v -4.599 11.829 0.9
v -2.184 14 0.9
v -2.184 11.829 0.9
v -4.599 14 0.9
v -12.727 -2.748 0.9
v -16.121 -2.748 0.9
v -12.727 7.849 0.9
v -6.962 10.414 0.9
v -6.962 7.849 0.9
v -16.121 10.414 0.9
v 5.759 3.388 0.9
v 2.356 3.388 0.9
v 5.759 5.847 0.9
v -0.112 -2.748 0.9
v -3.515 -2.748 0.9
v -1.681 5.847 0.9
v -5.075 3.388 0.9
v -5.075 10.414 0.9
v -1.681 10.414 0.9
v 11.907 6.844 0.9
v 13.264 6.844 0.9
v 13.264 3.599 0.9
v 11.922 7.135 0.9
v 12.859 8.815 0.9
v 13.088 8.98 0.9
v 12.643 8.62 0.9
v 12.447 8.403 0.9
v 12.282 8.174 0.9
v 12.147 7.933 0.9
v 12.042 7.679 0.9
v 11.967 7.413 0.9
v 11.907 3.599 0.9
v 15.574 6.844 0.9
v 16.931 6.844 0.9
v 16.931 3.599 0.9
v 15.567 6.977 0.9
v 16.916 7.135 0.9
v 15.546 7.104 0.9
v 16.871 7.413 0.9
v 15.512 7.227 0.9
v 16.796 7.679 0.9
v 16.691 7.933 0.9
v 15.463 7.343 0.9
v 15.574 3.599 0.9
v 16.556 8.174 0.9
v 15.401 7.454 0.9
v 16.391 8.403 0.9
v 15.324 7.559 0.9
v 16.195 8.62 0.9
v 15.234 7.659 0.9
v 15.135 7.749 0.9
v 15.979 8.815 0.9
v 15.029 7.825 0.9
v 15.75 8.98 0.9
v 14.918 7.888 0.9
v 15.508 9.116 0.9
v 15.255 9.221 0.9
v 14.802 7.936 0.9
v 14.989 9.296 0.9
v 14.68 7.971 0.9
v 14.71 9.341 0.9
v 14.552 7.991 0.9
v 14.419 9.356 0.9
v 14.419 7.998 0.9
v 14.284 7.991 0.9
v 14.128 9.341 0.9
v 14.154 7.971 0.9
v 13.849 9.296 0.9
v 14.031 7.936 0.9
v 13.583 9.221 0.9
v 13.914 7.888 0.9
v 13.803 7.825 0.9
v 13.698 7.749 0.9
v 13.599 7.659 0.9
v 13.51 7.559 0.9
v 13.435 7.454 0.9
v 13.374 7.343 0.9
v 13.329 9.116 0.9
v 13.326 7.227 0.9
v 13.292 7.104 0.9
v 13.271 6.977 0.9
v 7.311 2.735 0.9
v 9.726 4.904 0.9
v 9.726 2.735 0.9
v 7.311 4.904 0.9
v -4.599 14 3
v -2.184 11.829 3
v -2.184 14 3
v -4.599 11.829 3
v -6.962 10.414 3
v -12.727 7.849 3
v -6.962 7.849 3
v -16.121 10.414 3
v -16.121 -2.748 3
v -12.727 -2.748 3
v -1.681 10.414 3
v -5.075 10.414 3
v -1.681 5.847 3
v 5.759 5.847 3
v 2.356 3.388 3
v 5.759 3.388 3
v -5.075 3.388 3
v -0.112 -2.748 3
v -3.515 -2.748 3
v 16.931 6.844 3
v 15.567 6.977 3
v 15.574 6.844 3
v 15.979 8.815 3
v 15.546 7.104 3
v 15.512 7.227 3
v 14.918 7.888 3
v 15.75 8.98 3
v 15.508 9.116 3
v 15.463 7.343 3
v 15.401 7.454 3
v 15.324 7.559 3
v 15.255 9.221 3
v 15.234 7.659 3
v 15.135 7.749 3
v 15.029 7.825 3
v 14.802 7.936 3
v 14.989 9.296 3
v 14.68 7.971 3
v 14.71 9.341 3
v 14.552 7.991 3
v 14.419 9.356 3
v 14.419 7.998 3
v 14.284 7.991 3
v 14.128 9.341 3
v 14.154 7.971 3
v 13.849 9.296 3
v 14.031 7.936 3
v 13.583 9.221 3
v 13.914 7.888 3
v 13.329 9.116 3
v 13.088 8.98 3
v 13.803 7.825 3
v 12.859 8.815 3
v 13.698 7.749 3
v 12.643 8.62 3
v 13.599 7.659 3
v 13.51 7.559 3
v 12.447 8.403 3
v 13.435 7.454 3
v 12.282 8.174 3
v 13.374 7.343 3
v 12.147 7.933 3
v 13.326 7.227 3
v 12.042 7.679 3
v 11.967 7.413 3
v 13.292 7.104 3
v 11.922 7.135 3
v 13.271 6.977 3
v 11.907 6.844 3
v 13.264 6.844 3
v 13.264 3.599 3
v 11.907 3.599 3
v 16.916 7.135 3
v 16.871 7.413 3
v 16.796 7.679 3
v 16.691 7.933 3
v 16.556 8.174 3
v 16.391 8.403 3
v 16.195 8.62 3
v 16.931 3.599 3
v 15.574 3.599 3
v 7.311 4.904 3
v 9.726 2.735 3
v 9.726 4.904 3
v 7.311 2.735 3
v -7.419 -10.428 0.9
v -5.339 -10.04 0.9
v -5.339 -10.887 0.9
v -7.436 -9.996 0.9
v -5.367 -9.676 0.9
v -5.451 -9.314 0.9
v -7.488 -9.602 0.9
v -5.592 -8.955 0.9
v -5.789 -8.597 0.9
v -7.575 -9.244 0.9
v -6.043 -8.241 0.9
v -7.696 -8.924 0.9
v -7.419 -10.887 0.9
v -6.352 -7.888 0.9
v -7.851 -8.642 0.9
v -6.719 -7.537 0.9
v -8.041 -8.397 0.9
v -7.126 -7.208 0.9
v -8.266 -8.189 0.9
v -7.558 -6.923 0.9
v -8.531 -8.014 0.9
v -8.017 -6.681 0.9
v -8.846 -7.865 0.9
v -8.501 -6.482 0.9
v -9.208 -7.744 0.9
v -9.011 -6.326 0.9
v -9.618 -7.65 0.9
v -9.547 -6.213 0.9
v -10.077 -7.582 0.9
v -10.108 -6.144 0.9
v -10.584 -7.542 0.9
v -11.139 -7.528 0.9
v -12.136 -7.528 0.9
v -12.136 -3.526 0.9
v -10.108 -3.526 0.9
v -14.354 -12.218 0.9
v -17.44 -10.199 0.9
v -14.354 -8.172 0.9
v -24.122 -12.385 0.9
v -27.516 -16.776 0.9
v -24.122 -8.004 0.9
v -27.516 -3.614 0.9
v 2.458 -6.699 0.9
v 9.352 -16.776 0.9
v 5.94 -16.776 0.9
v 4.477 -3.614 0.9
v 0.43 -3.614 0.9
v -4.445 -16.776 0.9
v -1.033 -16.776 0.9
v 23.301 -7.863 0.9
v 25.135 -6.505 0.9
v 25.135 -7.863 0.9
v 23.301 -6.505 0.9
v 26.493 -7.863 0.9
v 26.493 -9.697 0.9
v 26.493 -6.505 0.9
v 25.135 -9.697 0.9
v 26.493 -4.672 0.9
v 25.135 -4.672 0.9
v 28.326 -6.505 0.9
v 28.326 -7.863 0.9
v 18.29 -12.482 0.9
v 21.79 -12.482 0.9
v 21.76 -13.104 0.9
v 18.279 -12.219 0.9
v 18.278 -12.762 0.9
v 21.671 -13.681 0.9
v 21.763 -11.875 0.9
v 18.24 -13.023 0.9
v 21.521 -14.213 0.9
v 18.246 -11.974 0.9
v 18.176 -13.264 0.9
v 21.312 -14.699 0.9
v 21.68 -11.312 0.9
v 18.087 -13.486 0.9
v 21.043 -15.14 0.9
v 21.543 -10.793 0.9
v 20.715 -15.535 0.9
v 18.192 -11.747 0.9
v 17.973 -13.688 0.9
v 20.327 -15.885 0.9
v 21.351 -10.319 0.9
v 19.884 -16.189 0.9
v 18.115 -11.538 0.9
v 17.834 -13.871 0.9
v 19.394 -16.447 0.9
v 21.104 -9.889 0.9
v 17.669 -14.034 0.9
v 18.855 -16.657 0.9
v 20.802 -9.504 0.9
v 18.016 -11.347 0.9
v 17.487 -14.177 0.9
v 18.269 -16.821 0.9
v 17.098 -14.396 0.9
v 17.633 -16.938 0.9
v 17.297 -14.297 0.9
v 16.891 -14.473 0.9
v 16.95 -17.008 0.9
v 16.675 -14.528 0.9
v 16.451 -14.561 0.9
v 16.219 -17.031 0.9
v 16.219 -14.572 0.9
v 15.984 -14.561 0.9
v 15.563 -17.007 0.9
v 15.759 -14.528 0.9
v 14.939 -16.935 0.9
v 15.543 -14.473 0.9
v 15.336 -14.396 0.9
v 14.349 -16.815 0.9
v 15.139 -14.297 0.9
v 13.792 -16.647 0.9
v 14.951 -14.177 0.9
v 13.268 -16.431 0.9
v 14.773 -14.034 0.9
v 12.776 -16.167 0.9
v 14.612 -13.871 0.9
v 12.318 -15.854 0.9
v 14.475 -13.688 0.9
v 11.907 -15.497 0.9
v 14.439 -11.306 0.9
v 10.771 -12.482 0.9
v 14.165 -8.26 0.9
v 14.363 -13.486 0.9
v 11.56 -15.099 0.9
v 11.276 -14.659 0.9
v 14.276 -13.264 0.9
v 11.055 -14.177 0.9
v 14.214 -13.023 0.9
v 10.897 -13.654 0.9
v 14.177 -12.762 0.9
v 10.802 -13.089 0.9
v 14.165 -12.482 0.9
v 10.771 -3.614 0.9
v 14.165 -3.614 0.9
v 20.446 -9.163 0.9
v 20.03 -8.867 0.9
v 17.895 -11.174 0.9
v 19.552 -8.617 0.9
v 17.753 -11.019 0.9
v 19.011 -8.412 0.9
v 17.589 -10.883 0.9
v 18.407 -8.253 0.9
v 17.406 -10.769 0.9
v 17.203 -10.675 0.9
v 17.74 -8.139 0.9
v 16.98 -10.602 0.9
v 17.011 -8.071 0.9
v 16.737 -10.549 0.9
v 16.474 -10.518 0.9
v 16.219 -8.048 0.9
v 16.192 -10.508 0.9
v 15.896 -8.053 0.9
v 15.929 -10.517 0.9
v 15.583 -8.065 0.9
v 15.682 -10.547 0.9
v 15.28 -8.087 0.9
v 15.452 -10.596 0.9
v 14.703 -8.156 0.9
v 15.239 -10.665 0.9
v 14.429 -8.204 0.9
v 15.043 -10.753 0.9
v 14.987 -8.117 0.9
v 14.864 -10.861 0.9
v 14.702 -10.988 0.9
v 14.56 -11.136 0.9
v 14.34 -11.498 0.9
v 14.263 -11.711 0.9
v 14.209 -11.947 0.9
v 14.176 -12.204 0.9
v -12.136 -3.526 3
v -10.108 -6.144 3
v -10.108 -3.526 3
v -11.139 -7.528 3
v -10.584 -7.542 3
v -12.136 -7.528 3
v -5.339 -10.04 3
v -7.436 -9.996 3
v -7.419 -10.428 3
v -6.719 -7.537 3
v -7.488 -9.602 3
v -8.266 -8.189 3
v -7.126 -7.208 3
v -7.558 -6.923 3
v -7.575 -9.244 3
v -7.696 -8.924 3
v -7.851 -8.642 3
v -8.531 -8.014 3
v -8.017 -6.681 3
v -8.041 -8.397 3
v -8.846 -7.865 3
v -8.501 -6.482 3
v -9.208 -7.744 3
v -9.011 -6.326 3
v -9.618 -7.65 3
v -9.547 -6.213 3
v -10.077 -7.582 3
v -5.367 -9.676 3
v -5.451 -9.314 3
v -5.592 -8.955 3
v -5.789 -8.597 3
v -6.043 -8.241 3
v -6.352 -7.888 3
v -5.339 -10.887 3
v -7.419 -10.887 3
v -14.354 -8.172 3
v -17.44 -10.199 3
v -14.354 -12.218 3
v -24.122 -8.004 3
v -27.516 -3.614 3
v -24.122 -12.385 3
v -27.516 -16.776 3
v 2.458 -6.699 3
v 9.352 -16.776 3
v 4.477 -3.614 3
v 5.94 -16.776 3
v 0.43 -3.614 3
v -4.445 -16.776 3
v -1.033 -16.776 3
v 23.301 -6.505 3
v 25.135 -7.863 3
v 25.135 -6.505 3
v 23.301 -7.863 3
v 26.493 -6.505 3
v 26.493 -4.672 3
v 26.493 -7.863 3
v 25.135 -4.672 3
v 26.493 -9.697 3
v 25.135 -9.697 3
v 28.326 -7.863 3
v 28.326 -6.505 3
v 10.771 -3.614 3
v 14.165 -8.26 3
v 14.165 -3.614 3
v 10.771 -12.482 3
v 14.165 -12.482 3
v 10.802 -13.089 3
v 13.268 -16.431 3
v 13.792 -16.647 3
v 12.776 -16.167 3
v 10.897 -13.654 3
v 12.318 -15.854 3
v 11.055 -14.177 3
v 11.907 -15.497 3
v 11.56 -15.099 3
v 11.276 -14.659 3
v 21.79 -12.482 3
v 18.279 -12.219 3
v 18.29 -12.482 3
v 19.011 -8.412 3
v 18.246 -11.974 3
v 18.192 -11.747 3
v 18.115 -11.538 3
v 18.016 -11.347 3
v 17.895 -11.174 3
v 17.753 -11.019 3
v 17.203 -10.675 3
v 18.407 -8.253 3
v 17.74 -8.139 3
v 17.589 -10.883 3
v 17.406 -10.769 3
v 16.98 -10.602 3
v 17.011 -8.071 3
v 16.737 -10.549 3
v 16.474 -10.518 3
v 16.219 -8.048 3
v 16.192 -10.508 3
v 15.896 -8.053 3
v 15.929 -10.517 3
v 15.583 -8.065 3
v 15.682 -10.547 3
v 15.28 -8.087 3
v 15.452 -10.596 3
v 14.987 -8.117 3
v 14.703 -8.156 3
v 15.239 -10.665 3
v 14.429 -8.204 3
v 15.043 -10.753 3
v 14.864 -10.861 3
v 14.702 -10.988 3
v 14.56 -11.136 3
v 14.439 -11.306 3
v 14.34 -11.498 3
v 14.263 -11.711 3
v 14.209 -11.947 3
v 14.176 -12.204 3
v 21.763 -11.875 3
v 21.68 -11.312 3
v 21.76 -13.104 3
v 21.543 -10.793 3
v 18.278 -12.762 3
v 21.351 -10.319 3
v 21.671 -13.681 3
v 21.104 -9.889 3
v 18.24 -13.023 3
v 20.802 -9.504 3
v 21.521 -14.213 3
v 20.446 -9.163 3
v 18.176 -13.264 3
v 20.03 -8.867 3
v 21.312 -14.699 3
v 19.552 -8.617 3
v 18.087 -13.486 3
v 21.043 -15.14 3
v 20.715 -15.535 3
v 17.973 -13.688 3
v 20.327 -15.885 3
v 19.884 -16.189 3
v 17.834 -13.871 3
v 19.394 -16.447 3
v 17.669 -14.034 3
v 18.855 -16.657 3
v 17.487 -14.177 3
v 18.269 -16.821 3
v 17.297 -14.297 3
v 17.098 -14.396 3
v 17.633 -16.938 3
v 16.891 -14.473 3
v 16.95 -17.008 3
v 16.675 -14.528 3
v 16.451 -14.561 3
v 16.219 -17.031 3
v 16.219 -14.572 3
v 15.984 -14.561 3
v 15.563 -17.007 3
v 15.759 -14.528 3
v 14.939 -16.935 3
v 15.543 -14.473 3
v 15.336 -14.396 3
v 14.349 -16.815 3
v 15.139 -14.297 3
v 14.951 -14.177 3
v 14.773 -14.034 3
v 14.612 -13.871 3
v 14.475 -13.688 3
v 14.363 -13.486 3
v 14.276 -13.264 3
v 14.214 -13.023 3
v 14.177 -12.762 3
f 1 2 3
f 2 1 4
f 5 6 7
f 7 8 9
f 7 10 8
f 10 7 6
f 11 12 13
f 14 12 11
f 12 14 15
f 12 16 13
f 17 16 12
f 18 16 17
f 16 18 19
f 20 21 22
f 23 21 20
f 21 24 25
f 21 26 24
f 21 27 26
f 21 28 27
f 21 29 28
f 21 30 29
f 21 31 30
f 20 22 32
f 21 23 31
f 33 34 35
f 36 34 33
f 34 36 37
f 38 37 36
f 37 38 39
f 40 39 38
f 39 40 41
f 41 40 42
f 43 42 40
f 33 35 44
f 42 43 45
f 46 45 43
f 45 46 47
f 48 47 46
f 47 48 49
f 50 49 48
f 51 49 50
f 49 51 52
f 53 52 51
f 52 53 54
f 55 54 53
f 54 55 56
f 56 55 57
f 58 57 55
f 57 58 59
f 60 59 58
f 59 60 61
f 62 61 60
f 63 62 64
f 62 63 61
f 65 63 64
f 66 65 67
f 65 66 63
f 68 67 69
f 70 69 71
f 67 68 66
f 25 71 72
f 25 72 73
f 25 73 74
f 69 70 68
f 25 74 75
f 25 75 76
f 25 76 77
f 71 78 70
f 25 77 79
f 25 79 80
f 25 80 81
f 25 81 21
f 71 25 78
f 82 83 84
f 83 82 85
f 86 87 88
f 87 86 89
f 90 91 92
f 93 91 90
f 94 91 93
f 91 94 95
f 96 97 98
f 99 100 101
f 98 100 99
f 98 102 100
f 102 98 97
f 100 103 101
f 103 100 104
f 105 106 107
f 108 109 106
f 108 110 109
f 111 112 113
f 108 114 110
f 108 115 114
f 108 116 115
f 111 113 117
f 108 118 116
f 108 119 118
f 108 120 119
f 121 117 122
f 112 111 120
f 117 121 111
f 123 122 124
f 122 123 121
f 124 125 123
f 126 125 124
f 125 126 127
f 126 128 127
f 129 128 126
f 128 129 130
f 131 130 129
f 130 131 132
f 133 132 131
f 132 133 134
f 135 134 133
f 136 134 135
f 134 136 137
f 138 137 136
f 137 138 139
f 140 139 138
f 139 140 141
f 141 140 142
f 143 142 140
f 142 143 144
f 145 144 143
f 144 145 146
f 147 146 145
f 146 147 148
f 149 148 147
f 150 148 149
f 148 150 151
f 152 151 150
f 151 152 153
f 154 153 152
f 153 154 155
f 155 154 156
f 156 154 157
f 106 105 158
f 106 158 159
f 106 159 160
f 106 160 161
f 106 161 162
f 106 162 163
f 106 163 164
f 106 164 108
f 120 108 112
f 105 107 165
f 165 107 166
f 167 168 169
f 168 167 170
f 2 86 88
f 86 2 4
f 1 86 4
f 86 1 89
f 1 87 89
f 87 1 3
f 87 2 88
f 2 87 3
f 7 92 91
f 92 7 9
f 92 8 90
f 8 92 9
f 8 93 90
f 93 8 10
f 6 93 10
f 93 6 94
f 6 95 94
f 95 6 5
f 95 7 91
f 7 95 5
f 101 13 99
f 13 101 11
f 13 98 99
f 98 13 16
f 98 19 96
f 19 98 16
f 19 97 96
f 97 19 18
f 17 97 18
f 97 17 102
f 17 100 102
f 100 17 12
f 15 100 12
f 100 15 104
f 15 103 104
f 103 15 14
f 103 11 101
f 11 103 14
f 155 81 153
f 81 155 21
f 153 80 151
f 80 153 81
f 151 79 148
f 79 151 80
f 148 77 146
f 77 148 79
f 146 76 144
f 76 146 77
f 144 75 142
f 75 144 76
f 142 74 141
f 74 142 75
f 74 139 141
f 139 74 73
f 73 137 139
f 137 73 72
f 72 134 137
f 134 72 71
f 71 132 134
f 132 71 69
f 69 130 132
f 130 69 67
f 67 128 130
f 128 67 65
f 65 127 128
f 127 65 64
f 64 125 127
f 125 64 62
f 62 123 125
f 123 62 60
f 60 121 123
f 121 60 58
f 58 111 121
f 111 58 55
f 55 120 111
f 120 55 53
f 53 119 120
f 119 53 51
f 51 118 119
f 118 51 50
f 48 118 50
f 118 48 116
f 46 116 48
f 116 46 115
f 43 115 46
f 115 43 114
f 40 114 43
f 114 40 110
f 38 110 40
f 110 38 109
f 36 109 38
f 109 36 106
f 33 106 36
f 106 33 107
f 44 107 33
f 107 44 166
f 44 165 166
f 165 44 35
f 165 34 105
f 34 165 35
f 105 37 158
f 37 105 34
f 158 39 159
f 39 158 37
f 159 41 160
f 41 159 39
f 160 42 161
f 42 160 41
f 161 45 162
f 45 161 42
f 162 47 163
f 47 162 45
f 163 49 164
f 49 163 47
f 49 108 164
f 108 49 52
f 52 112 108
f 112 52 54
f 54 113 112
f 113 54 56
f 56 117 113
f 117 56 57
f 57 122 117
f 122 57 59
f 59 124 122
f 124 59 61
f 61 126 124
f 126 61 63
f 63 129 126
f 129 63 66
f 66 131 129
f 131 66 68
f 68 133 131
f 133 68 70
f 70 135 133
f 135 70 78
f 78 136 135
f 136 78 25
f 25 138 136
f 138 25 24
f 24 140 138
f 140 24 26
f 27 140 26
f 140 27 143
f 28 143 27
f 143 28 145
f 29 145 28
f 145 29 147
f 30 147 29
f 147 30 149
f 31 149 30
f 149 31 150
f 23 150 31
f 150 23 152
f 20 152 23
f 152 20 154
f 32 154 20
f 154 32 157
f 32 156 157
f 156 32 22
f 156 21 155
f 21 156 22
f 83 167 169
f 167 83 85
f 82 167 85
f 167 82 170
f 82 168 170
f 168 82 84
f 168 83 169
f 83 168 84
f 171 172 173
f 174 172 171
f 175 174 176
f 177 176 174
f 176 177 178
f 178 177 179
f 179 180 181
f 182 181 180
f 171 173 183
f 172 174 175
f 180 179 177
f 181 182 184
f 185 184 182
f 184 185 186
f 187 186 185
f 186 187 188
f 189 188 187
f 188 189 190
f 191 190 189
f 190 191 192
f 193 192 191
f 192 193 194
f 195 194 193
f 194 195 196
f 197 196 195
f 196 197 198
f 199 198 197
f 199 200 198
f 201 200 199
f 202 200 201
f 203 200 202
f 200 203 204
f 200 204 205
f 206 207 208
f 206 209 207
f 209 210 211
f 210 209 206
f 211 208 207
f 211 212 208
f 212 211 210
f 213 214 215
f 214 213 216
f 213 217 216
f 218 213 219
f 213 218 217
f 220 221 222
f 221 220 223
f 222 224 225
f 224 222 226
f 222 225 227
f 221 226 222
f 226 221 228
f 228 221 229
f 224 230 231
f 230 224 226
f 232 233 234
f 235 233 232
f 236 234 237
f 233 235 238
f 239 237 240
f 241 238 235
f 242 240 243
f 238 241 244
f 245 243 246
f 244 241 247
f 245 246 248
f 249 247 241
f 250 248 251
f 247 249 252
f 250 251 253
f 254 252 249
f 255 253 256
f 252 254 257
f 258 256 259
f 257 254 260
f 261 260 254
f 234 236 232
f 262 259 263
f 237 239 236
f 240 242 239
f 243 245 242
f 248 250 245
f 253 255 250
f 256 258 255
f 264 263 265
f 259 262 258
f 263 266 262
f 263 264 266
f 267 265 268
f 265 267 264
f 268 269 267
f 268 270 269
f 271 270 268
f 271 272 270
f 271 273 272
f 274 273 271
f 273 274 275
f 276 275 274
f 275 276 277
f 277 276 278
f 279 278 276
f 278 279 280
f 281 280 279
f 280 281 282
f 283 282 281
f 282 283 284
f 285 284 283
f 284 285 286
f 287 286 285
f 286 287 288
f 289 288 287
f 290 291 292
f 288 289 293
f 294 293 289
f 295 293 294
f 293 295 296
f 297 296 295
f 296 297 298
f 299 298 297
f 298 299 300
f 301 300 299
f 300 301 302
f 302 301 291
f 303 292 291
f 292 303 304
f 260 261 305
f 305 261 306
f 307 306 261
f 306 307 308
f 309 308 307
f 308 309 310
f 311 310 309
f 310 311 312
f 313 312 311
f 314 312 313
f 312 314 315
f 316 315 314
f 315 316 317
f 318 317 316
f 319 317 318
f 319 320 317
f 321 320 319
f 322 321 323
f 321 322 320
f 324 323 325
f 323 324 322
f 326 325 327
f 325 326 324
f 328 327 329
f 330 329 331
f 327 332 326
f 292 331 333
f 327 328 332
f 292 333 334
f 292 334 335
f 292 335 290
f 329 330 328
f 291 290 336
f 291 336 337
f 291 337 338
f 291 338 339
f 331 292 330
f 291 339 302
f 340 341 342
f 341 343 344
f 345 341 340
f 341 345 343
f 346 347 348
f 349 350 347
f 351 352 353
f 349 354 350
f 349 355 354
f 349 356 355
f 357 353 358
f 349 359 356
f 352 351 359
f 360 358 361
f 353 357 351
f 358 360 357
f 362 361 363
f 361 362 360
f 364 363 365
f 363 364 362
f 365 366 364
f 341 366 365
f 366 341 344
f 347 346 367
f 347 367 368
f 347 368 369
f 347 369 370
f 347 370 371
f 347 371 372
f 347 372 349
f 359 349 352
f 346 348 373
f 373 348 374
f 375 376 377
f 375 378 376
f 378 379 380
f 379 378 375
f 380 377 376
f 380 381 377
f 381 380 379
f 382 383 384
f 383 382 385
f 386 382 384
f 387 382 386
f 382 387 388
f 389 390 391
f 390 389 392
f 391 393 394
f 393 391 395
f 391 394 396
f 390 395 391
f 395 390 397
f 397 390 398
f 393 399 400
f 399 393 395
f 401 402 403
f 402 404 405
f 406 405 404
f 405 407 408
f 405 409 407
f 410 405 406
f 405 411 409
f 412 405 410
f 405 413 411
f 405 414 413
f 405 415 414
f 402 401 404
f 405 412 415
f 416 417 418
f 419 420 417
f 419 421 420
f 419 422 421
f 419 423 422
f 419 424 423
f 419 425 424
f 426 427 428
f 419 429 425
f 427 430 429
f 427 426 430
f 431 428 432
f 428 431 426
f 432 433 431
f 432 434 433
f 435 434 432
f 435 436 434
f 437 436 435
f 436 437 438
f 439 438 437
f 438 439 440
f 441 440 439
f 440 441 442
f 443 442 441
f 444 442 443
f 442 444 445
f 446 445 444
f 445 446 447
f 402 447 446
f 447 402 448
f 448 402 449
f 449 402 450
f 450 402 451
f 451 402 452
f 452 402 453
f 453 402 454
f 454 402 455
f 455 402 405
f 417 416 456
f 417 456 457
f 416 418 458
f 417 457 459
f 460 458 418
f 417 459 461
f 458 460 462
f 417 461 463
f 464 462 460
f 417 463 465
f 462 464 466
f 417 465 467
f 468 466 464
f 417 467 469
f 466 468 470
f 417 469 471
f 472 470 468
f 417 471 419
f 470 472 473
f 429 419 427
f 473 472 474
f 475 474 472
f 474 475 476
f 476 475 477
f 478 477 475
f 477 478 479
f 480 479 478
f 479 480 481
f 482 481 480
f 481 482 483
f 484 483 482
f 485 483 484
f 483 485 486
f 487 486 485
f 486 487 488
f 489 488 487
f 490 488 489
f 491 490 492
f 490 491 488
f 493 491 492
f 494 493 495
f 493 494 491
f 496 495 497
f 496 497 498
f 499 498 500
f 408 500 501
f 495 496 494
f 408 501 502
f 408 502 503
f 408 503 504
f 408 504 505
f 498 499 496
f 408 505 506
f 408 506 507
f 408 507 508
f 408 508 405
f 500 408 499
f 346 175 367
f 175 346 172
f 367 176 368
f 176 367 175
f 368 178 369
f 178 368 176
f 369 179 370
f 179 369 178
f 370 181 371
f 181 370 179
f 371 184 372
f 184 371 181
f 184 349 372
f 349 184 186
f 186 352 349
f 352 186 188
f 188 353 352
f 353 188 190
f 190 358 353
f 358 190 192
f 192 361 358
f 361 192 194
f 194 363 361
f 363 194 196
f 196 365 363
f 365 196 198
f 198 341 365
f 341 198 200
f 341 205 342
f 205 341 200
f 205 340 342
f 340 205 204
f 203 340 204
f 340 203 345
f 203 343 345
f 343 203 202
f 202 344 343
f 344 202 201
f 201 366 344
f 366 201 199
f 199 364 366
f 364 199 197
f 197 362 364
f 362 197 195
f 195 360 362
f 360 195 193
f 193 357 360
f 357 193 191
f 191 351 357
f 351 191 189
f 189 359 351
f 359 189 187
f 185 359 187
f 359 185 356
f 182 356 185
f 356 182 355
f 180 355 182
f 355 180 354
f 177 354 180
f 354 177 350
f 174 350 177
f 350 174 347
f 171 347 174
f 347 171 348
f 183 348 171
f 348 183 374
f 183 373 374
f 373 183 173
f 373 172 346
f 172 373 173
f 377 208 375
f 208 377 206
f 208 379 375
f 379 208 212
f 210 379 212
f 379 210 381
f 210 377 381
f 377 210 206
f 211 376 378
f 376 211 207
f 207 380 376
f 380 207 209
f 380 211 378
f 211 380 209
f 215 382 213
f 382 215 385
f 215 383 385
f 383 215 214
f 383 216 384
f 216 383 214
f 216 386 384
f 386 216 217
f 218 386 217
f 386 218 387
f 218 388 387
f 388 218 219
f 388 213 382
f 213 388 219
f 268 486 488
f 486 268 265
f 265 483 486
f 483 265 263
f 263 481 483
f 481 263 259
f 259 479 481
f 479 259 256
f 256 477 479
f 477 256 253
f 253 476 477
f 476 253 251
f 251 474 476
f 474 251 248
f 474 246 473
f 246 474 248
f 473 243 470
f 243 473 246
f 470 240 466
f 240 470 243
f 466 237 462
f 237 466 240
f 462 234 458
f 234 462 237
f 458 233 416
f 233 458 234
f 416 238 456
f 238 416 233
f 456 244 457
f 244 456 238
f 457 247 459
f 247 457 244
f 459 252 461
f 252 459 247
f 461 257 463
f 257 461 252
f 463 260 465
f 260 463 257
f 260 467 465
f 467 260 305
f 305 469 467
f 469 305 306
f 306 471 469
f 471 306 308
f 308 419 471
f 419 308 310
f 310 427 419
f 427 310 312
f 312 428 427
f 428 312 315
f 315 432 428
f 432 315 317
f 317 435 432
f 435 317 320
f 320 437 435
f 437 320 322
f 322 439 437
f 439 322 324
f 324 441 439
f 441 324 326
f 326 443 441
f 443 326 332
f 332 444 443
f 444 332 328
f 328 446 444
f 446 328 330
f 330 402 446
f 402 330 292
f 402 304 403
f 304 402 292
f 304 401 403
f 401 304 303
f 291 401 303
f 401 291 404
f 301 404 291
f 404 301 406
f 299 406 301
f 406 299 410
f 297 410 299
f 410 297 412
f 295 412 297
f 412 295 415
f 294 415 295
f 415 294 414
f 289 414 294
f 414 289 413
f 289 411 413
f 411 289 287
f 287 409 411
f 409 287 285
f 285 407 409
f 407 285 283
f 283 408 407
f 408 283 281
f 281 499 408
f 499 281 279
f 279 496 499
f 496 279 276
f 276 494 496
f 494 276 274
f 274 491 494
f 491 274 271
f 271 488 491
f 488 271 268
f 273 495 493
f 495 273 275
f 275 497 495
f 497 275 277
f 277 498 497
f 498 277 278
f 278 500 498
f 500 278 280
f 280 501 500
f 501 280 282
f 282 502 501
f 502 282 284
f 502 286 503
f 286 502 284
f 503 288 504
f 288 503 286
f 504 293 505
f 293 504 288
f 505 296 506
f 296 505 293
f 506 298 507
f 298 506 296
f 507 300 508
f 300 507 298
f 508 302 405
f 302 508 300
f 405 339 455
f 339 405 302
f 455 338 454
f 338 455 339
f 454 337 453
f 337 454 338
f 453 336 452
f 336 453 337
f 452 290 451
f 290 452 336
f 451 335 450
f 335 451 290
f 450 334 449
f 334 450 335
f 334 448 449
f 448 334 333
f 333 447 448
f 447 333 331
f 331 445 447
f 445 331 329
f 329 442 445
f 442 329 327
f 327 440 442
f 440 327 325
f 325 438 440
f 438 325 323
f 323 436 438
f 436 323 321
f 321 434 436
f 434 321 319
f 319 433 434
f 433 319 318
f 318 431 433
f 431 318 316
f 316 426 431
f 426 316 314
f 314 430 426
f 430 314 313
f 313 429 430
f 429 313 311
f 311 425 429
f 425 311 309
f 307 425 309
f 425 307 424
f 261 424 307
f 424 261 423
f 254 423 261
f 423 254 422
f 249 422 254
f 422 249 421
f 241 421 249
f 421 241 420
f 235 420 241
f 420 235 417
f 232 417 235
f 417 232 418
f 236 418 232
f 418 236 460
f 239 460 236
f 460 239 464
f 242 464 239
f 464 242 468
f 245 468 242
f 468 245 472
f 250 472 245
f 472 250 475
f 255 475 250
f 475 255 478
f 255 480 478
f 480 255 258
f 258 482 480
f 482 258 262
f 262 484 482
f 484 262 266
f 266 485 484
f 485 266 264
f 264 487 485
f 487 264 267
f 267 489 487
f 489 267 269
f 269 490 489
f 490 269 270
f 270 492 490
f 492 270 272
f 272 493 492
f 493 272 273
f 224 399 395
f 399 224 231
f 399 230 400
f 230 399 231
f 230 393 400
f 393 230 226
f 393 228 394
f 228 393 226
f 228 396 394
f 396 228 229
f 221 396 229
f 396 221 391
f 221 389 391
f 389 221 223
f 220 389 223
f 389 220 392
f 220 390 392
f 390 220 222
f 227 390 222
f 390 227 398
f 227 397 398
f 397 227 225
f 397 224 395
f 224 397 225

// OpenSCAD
$fn = 48;
  // syllabics (overlaid on icon, tallest)
  translate([0, 5.430, 0.900]) linear_extrude(height=2.100) text("ᒥᔼᐢ", size=13.000, halign="center", valign="center", font="Euphemia UCAS:style=Bold");
  translate([0, -10.430, 0.900]) linear_extrude(height=2.100) text("ᐅᔅᐱᑲᐩ", size=13.000, halign="center", valign="center", font="Euphemia UCAS:style=Bold");
